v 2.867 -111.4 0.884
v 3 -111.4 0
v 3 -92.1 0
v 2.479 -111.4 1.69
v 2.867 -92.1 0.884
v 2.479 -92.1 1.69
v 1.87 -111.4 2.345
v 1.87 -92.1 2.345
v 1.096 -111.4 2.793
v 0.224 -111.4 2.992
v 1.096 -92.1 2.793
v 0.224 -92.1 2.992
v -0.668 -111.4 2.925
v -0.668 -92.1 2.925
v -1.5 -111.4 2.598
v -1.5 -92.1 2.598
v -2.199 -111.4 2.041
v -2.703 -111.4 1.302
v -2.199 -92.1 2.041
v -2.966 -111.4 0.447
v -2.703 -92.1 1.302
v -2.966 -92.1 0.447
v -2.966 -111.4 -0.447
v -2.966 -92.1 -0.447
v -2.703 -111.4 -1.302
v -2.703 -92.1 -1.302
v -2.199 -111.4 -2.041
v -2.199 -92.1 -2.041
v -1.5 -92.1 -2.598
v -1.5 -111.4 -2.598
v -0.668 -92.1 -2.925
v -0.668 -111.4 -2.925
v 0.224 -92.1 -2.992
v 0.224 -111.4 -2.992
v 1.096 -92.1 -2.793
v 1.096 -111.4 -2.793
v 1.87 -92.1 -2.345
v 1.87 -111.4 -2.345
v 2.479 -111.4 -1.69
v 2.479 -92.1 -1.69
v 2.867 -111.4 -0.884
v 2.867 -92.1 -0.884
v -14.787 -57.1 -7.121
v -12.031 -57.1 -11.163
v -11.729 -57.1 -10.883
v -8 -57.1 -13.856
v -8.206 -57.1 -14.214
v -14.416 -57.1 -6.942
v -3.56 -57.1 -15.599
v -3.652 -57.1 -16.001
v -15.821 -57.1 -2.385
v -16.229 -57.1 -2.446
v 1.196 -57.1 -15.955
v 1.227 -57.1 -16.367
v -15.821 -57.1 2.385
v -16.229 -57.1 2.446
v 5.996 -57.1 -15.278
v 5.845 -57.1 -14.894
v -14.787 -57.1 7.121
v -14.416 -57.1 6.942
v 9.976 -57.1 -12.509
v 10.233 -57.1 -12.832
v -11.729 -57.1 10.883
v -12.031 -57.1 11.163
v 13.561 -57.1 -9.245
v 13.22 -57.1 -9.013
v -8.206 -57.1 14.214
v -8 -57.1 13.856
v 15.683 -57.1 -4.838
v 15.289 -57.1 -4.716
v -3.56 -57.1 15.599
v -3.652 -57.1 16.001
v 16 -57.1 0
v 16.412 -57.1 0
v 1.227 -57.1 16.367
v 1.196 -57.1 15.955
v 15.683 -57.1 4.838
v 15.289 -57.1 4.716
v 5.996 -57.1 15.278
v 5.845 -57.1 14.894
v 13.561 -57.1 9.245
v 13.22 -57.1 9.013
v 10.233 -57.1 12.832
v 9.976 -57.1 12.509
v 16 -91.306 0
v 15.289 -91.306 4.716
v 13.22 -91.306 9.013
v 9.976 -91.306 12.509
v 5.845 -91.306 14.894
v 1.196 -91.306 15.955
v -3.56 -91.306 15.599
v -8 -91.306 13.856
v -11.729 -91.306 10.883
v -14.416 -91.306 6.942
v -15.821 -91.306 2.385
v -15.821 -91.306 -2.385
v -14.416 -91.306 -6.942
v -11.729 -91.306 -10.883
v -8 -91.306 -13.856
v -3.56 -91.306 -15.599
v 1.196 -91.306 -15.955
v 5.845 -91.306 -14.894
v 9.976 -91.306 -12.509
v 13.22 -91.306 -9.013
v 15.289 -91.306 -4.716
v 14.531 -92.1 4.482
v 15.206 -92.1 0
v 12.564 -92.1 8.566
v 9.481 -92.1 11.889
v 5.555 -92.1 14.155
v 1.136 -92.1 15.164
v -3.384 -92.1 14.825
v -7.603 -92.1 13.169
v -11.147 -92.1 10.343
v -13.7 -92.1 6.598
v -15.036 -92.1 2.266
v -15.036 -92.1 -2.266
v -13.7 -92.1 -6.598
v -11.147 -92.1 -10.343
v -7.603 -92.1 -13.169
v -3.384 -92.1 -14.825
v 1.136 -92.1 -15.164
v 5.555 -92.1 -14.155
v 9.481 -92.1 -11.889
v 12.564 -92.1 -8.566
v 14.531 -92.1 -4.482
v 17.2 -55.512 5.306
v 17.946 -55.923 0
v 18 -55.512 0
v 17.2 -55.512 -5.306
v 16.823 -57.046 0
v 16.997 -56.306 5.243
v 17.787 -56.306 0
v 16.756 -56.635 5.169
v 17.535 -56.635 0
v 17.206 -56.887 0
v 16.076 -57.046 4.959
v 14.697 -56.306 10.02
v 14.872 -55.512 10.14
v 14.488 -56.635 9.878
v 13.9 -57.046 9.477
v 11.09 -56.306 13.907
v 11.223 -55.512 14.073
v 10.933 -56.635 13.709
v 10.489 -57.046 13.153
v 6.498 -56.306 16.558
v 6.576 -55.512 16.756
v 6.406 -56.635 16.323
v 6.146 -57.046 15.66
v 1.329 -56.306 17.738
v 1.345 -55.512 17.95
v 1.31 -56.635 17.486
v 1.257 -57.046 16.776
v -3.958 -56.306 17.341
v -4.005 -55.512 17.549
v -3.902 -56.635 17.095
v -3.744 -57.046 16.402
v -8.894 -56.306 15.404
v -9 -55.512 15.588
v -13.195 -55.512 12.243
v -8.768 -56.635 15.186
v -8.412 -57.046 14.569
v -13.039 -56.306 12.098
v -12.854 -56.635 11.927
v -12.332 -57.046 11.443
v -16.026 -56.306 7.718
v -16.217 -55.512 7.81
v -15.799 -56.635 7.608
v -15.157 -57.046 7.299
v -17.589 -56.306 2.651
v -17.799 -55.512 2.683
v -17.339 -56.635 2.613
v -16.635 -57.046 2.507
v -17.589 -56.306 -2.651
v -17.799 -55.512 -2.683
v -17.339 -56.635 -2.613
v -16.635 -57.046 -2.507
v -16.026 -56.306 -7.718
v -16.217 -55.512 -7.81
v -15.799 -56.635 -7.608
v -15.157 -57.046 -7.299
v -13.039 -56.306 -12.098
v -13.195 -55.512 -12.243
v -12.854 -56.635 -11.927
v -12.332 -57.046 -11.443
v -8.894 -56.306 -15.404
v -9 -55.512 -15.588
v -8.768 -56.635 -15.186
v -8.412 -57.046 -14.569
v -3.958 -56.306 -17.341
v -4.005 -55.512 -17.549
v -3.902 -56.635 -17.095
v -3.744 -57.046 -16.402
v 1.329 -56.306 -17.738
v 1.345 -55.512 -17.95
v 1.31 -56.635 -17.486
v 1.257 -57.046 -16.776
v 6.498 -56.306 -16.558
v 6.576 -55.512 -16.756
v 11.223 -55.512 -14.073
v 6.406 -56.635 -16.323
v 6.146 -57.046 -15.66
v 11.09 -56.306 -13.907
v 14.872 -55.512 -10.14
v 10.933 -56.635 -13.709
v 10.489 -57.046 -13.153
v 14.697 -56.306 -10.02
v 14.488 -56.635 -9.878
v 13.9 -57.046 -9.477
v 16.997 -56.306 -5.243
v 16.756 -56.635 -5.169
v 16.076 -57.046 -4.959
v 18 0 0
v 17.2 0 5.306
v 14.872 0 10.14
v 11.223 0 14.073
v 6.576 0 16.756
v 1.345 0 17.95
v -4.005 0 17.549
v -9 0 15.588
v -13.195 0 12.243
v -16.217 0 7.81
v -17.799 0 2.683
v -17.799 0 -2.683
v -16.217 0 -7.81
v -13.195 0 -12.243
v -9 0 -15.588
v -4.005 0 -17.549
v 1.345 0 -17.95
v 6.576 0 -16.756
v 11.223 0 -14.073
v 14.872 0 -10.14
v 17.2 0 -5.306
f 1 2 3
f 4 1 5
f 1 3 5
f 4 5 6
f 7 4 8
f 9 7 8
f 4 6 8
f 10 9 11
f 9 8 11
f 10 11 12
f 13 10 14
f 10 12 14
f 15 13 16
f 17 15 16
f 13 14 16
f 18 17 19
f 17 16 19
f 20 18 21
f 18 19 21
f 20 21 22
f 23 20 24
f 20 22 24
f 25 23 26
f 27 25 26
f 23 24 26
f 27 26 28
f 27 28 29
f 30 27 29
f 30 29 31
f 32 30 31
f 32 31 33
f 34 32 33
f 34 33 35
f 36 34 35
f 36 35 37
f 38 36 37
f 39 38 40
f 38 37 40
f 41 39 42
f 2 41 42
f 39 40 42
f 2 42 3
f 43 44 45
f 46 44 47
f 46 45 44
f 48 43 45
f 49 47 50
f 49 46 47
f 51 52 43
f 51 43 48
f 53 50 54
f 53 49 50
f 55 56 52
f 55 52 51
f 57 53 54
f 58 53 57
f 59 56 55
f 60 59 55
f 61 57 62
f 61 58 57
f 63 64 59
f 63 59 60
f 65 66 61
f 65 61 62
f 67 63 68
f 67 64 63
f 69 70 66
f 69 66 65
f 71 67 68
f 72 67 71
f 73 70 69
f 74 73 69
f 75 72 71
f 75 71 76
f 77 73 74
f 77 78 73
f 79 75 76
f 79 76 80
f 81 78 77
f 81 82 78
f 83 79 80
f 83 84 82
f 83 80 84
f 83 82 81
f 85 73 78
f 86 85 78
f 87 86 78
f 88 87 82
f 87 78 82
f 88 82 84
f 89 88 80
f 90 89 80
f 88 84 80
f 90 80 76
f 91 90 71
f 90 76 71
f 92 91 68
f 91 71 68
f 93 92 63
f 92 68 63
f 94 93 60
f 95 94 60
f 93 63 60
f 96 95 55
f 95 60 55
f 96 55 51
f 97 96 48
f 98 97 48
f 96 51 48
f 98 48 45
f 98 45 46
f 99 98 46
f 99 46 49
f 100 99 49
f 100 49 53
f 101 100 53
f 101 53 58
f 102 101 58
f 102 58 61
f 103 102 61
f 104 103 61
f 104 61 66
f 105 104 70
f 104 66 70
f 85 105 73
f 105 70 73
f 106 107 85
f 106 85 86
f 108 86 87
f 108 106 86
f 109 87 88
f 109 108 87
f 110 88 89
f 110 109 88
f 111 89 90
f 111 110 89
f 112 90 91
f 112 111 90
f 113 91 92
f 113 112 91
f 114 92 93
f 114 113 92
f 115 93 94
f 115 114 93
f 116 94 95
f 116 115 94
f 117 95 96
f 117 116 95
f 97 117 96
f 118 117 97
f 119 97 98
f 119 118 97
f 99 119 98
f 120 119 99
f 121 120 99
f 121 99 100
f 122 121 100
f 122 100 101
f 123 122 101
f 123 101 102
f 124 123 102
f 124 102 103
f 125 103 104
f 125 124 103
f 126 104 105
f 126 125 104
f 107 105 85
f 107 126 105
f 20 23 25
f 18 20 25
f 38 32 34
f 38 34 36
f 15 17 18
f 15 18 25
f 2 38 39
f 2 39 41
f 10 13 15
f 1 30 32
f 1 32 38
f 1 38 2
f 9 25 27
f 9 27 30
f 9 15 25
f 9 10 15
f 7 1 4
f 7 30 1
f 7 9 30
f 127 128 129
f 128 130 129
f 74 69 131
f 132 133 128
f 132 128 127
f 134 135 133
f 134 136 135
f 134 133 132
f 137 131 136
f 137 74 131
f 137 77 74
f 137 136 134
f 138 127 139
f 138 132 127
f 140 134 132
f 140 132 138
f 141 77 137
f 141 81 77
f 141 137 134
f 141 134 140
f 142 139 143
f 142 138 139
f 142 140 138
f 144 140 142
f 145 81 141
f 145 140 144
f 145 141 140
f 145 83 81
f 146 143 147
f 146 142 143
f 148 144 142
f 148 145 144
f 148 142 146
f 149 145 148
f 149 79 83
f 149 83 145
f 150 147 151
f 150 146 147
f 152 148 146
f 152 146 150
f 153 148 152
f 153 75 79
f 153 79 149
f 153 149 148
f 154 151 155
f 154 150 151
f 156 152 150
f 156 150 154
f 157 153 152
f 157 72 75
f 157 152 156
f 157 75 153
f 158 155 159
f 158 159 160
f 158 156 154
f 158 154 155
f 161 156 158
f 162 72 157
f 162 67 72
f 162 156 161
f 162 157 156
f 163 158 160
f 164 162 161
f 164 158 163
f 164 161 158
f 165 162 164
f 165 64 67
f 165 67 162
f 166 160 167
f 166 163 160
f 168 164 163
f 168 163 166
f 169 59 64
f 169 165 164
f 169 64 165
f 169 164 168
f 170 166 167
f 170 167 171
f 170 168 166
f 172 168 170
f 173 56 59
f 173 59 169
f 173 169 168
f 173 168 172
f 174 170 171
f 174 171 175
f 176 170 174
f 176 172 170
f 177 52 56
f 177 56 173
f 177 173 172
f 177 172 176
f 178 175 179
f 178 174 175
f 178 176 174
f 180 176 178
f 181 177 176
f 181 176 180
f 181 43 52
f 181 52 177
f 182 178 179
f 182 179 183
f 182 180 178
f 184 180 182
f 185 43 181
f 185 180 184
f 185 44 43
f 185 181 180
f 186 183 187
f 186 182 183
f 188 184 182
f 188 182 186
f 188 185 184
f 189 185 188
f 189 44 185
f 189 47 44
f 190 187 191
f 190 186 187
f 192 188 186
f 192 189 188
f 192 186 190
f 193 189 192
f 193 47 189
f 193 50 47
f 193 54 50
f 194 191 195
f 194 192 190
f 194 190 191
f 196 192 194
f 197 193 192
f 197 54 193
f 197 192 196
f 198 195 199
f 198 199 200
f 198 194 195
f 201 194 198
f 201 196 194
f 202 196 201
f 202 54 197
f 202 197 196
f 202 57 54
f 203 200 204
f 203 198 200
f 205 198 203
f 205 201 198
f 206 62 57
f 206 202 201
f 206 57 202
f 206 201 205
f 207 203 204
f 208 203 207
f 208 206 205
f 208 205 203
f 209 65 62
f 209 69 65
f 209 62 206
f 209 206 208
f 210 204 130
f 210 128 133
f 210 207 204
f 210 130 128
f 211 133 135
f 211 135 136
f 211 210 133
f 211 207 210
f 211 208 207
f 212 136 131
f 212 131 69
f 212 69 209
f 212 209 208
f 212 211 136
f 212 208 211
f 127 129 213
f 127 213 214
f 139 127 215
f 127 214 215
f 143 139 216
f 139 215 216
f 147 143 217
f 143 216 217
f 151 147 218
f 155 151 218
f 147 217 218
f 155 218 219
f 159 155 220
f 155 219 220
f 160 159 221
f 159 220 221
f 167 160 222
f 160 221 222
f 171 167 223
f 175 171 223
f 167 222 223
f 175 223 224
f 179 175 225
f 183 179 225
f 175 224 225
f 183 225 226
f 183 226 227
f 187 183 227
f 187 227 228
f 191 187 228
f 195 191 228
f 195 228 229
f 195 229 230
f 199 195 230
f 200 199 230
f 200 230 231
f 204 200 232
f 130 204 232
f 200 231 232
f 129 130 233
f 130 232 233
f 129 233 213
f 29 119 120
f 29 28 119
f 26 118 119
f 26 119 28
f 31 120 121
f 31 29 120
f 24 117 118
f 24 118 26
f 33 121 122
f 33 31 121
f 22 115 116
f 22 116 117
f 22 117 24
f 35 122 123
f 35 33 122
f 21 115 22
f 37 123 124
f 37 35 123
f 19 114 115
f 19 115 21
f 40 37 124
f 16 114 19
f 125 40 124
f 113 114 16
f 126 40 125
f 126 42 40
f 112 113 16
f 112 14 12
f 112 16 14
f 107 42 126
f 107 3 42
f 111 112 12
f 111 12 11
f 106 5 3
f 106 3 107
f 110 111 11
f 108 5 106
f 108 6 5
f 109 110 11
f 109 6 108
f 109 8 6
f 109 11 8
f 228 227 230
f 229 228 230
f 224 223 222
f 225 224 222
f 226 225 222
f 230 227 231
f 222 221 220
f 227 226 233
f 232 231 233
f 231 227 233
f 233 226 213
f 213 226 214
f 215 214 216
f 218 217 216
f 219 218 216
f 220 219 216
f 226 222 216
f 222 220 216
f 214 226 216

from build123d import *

# Parameters (mm, degrees)
F0_R     = 18
F1_DEPTH = 57.1
F2_R     = 16
F3_DEPTH = 35
F4_R     = 1.5875
F5_R     = 3
F6_DEPTH = 19.3
F7_SIZE  = 0.79375


with BuildPart() as f1:
    # F0 (on Front) → F1 (new body)
    with BuildSketch(Plane.XZ):
        Circle(F0_R)
    extrude(amount=F1_DEPTH)

    # F2 (on face) → F3 (join)
    with BuildSketch(Plane.XZ.offset(57.1)):
        Circle(F2_R)
    extrude(amount=F3_DEPTH)

    # F4
    f4_edges = [f1.edges().sort_by_distance(p)[0] for p in [
        (-18, -57.1, 0),
    ]]
    fillet(f4_edges, radius=F4_R)

    # F5 (on face) → F6 (join)
    with BuildSketch(Plane.XZ.offset(92.1)):
        Circle(F5_R)
    extrude(amount=F6_DEPTH)

    # F7
    f7_edges = [f1.edges().sort_by_distance(p)[0] for p in [
        (-16, -92.1, 0),
    ]]
    chamfer(f7_edges, length=F7_SIZE)


solid = f1.part
